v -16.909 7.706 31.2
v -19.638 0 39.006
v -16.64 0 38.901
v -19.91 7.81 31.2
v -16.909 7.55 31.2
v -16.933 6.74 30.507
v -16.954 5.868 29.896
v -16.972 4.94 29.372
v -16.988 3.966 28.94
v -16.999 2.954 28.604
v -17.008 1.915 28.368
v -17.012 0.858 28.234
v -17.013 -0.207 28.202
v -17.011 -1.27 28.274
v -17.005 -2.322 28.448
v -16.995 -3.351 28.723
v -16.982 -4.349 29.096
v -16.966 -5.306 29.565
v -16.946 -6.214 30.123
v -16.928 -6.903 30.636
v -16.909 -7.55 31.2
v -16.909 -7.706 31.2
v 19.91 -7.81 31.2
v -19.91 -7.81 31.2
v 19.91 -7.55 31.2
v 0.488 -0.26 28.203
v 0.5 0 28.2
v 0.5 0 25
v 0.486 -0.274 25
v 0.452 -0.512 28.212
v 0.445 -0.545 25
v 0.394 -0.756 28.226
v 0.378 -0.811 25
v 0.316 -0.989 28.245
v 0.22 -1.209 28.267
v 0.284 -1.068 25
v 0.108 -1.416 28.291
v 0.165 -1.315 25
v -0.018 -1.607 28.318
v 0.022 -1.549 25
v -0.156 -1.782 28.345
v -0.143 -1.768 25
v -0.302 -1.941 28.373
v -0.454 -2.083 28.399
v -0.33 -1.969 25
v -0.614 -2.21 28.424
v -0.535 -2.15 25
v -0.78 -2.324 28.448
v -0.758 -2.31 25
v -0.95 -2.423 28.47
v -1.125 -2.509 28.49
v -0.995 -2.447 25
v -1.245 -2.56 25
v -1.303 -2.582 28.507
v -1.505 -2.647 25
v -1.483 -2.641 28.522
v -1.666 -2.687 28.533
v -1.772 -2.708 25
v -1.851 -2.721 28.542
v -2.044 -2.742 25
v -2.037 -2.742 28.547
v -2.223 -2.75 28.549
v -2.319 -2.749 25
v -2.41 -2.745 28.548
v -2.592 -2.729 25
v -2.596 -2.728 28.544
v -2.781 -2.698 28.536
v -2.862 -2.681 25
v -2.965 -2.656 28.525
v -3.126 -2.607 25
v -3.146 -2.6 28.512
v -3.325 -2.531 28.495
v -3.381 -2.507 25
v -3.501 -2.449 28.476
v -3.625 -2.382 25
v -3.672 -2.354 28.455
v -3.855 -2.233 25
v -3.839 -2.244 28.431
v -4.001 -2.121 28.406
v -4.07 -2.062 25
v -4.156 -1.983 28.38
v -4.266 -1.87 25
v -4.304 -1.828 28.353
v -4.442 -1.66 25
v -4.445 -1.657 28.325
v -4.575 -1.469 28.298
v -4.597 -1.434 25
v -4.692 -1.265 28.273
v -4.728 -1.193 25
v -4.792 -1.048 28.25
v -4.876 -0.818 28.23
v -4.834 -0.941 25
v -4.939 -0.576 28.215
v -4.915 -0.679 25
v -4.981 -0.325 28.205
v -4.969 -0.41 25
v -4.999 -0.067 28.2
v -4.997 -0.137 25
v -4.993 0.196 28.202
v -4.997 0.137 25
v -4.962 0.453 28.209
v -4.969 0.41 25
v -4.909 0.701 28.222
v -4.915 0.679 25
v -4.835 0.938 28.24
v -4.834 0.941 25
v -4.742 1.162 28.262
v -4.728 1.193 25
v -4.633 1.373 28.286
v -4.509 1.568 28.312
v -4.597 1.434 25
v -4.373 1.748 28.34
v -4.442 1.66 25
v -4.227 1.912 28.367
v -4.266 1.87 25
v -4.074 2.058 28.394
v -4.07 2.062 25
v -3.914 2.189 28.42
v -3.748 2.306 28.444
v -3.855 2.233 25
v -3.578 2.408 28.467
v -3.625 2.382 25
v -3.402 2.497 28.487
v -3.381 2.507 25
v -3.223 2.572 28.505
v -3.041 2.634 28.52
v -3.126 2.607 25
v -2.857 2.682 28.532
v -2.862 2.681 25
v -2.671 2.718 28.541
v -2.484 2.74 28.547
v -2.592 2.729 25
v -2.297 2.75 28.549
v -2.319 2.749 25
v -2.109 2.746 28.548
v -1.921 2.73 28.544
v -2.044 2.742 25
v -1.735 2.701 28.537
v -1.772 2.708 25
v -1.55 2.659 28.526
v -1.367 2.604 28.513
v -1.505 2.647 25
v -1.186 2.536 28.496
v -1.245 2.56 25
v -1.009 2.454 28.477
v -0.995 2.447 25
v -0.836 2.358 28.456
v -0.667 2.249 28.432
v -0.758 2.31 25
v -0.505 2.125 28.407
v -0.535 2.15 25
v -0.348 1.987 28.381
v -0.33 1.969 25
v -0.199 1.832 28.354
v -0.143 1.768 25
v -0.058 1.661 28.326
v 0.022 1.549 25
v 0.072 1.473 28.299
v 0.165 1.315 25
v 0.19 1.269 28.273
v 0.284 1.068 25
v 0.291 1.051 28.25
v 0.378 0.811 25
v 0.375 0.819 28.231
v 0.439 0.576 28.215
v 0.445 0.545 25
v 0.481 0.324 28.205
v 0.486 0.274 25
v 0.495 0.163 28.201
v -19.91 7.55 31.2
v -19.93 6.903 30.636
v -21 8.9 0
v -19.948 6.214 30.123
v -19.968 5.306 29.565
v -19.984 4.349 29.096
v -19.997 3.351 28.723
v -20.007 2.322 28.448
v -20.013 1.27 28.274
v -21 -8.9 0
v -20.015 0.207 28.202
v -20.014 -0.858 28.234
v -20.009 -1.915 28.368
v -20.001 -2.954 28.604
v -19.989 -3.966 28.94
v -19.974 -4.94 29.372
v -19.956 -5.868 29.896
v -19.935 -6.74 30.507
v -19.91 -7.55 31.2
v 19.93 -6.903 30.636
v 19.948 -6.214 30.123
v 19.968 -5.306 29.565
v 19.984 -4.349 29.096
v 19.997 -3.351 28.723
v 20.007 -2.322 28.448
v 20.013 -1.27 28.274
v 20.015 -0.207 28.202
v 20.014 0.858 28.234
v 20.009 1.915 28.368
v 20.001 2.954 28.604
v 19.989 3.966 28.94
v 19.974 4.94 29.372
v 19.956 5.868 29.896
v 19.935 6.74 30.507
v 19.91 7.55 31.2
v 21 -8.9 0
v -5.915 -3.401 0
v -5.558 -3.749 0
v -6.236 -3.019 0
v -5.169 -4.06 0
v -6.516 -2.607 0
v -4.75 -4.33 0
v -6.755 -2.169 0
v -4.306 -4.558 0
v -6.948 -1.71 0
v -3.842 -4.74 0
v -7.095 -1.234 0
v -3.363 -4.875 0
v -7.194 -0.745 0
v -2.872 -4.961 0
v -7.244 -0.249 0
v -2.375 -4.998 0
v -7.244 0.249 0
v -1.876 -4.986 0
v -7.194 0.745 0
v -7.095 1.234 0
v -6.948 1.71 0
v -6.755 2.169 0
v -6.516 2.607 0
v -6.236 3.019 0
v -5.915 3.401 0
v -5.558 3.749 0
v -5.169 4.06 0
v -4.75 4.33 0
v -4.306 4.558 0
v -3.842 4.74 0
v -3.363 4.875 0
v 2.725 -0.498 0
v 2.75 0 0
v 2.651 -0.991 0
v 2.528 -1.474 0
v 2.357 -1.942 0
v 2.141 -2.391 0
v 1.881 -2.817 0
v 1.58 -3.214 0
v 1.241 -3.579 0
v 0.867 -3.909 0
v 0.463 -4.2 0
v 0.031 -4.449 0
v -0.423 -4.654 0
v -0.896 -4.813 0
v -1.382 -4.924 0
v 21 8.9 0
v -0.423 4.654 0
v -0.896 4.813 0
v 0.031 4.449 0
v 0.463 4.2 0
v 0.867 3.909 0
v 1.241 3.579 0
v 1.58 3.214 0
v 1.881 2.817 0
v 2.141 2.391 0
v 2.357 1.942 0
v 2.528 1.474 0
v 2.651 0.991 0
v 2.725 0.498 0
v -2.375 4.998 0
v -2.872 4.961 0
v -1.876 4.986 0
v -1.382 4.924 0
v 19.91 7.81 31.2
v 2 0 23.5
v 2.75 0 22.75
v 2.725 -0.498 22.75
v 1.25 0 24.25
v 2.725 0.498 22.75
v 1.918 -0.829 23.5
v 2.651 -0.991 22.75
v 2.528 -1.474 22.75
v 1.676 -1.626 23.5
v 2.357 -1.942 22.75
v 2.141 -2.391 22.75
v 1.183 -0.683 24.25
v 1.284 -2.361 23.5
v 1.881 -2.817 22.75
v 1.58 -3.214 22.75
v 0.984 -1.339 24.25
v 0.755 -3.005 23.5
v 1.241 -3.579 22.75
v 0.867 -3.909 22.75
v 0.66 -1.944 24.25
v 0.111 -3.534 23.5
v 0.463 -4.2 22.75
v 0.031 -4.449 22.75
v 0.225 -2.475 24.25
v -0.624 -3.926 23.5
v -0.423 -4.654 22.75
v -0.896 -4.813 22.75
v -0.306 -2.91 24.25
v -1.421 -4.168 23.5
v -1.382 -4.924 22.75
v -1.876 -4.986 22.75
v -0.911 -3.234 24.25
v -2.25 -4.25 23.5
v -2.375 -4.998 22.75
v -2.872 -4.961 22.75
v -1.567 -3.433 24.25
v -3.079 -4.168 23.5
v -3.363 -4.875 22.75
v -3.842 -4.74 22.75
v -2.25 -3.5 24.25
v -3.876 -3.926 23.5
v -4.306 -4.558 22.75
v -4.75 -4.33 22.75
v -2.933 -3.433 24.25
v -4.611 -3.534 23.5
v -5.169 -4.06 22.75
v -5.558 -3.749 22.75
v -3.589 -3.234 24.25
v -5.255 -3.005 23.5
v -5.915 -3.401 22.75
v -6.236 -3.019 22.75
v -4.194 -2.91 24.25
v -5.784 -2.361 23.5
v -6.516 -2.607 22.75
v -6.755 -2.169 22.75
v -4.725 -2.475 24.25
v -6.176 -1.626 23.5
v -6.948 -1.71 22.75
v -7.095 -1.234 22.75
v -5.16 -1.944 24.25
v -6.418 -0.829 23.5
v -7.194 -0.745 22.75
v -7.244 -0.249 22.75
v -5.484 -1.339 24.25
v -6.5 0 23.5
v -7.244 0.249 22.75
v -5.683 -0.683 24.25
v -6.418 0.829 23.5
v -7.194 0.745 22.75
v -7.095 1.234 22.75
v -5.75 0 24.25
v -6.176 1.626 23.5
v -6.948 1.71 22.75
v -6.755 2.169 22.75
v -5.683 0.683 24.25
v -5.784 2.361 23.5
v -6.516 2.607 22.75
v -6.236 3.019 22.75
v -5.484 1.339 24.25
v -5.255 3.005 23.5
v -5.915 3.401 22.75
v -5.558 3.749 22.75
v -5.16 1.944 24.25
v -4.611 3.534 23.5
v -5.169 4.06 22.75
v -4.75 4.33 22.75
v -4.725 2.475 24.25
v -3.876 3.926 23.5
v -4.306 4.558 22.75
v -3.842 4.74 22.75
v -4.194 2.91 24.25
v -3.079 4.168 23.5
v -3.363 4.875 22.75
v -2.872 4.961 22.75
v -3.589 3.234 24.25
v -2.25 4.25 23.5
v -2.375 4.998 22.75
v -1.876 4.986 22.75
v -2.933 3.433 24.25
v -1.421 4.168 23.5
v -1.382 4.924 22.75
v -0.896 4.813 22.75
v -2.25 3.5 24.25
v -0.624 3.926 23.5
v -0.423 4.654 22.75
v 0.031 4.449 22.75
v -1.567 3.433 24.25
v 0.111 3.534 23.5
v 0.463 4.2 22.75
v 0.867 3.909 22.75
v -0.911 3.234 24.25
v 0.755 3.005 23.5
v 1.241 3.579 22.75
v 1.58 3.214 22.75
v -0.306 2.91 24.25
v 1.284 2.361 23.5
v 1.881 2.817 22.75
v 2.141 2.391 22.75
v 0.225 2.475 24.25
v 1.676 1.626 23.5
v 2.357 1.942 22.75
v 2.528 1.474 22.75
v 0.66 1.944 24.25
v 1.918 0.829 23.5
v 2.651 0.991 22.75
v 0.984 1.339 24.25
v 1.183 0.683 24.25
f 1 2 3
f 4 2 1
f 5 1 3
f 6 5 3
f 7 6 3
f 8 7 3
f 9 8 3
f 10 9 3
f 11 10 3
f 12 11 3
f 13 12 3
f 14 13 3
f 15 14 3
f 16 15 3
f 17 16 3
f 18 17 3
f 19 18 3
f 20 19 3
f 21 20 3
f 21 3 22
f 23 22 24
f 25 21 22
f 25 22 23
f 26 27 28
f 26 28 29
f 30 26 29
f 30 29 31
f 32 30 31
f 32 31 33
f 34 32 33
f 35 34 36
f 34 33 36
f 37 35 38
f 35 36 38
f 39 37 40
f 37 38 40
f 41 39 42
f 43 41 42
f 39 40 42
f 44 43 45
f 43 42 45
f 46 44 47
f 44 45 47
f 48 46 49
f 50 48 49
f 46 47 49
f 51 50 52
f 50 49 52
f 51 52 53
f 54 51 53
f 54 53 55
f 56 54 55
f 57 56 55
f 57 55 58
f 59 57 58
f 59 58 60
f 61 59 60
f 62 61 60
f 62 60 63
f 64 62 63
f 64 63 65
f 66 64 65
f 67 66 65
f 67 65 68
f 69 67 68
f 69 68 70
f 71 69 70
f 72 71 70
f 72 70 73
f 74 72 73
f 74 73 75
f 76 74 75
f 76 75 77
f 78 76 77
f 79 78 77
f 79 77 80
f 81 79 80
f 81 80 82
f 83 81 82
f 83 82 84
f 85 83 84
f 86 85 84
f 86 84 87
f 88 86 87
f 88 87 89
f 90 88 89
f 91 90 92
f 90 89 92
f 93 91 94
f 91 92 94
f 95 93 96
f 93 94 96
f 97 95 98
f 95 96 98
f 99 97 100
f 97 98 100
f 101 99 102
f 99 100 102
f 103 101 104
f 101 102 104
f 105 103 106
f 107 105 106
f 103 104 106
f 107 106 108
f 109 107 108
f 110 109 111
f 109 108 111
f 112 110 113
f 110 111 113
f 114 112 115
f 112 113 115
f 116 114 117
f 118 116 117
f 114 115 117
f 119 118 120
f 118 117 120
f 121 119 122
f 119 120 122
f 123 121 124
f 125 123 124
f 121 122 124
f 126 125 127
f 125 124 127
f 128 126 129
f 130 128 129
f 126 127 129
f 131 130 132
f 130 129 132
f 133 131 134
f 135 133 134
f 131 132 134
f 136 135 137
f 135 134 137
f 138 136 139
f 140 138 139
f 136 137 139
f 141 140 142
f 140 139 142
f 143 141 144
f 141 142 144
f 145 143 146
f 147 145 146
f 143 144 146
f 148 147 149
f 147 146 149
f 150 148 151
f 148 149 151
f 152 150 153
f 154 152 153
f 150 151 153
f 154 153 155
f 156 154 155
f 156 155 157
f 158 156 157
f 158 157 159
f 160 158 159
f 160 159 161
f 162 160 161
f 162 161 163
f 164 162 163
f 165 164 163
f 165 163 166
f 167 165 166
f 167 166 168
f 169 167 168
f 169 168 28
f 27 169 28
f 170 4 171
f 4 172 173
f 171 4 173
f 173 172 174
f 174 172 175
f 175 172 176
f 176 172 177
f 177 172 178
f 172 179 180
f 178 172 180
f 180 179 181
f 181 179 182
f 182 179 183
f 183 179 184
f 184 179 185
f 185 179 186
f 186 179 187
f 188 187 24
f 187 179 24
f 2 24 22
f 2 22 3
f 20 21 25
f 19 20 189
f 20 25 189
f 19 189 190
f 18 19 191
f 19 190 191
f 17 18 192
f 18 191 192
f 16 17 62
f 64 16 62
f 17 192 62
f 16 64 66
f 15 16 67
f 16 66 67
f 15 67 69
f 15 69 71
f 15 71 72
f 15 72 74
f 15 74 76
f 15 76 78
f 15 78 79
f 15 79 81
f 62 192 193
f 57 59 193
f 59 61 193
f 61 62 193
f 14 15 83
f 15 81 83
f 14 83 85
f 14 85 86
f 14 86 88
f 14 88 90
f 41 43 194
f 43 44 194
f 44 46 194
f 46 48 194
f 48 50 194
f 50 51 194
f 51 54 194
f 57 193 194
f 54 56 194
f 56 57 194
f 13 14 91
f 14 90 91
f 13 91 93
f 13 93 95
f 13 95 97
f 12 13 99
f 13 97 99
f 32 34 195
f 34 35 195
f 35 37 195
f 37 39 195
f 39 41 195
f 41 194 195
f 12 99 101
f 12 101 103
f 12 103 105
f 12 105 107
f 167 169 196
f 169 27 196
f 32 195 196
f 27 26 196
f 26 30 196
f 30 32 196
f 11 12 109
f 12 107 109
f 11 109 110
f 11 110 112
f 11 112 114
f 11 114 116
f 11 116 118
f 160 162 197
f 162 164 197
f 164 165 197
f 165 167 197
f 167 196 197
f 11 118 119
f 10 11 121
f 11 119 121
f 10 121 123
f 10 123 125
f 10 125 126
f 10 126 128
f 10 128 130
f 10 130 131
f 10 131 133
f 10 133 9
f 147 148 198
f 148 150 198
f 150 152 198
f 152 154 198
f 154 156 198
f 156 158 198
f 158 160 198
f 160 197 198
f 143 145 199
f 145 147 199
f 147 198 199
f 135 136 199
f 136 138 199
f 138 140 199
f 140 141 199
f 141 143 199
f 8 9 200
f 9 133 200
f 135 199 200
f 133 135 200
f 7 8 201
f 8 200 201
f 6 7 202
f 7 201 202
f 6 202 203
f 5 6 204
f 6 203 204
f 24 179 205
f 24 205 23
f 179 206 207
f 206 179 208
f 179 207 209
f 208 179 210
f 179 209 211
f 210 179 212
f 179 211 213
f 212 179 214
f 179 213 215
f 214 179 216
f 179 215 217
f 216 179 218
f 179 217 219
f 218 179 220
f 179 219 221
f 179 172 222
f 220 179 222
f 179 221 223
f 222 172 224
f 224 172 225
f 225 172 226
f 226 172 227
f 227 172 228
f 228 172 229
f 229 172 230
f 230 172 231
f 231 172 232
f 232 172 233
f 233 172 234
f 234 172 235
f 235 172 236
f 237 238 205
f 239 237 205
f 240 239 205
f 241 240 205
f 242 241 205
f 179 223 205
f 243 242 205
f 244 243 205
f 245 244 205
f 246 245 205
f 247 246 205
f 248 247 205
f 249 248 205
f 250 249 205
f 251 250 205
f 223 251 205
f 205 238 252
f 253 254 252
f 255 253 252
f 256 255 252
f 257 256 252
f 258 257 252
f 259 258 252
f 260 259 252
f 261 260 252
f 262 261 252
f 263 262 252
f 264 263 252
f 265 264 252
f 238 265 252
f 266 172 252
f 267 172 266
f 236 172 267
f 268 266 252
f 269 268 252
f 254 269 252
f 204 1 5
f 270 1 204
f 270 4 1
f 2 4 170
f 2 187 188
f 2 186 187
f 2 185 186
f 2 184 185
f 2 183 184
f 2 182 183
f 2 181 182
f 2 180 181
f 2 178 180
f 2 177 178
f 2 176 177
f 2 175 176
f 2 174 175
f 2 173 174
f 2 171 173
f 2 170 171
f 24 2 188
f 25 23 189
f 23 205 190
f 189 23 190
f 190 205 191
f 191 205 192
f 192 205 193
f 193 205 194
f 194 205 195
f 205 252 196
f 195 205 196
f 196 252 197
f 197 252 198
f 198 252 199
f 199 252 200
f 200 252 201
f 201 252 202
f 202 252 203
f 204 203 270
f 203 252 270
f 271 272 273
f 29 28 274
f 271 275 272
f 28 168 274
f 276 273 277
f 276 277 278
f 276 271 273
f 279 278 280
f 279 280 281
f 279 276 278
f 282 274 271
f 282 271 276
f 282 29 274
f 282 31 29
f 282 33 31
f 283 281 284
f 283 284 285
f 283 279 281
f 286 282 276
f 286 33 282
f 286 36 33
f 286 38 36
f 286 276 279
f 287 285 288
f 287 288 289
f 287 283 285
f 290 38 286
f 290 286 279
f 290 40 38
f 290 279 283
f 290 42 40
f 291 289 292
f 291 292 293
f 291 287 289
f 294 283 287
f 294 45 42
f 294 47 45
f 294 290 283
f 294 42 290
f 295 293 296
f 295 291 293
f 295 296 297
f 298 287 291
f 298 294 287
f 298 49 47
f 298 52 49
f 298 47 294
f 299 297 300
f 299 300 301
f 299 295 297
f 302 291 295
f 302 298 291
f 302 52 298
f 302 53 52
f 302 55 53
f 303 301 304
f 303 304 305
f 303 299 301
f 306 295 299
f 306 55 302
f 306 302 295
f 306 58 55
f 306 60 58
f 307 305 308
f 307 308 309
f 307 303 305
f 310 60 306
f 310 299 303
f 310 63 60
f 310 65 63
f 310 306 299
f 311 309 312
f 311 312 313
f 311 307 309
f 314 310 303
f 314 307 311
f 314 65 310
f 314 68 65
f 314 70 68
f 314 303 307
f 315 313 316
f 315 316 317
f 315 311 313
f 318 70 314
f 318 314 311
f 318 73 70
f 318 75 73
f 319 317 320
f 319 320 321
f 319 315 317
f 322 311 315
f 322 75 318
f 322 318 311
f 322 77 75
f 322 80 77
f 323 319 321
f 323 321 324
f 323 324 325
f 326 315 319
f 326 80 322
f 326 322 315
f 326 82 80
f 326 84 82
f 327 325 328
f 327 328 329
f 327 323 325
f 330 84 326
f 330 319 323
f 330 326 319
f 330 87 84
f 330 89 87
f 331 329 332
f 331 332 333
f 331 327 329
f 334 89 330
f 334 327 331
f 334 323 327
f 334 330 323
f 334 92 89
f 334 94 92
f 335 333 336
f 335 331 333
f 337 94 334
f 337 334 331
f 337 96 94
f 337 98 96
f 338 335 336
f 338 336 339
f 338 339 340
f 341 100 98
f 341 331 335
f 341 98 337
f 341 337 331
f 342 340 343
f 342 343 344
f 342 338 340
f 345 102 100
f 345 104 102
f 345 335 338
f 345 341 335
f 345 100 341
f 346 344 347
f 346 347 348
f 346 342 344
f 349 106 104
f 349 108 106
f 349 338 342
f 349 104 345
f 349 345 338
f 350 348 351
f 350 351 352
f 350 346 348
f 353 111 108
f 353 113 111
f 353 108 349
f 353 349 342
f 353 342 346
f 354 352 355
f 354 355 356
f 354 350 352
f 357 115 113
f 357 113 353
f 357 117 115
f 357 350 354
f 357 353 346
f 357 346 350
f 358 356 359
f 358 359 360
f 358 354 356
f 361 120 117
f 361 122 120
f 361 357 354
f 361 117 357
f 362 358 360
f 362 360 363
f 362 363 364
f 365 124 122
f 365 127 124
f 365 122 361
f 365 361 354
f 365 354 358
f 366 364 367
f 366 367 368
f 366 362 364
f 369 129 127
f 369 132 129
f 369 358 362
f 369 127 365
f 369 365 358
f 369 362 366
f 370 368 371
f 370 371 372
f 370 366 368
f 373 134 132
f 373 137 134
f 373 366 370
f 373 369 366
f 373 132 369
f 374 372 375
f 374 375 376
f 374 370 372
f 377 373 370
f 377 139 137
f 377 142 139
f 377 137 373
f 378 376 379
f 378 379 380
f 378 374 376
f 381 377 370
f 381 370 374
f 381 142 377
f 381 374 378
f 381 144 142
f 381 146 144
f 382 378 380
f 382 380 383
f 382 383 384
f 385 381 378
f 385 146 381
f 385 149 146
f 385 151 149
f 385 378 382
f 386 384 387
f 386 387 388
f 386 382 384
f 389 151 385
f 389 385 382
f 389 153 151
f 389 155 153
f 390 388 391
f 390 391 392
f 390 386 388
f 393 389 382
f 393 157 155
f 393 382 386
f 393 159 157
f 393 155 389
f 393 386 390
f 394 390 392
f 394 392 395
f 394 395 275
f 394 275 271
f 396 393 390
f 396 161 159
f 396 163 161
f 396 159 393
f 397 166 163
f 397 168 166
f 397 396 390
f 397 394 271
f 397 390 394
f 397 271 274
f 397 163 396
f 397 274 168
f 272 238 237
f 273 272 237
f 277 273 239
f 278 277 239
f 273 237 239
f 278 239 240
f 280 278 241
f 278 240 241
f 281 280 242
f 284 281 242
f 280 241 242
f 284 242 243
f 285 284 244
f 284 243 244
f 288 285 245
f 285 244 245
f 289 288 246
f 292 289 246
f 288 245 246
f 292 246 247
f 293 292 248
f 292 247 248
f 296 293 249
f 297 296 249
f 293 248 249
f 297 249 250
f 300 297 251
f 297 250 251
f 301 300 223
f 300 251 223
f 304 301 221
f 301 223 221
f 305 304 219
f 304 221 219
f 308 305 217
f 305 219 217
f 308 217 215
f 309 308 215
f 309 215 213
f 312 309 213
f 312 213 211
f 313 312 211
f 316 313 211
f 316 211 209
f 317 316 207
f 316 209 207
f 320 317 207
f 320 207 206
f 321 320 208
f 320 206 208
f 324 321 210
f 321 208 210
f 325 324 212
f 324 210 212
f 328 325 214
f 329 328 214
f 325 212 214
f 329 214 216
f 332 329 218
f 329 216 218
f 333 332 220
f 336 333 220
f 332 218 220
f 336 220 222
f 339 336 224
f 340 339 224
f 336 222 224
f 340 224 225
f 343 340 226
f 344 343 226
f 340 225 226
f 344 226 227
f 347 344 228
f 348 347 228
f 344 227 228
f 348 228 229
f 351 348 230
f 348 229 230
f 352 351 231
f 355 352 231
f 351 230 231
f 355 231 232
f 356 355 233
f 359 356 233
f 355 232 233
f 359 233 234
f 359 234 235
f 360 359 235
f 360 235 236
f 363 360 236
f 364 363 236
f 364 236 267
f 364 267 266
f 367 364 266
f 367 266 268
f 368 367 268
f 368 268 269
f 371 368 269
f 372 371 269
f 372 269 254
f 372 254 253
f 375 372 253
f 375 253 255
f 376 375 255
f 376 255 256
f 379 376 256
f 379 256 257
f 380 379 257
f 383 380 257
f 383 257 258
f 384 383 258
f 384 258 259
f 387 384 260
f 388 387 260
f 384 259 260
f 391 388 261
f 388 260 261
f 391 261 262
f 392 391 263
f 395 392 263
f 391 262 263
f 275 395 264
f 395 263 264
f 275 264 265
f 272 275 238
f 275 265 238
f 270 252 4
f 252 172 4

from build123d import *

# Parameters (mm, degrees)
F0_W     = 42
F0_H     = 17.8
F1_DEPTH = 31.2
F1_TAPER = 2
F2_R     = 11
F3_DEPTH = 25
F5_DEPTH = 3
F6_R     = 2.75
F7_DEPTH = 39.0067140634
F8_R     = 5
F8_R_2   = 2.75
F9_DEPTH = 25
F10_SIZE = 2.24999


# Not quite as in the source:
# - a fillet or chamfer is up to 0.001 mm smaller than in the source, because OpenCascade refuses the exact size


with BuildPart() as f1:
    # F0 (on Top) → F1 (new body)
    with BuildSketch(Plane.XY):
        Rectangle(F0_W, F0_H)
    extrude(amount=F1_DEPTH, taper=F1_TAPER)

    # F2 (on Right) → F3 (cut, symmetric)
    with BuildSketch(Plane.YZ):
        with Locations((0, 39.2)):
            Circle(F2_R)
    extrude(amount=F3_DEPTH, both=True, mode=Mode.SUBTRACT)

    # F4 (on face) → F5 (join)
    with BuildSketch(Plane(origin=(-20.9744225277, 0, 0.7324429743), x_dir=(0, -1, 0), z_dir=(-0.999390827, 0, 0.0348994967))):
        with BuildLine():
            Line((0, 38.2966003432), (-7.8104719919, 30.4861283514))
            Line((-7.8104719919, 30.4861283514), (-7.5498344353, 30.4861283514))
            add(Edge.make_bspline(
                [(7.5498344353, 30.4861283514), (0, 23.3567853482), (-7.5498344353, 30.4861283514)],
                knots=[2.3851362689, 2.3851362689, 2.3851362689, 3.8980490383, 3.8980490383, 3.8980490383], degree=2, weights=[1, 0.7272727273, 1]))
            Line((7.5498344353, 30.4861283514), (7.8104719919, 30.4861283514))
            Line((7.8104719919, 30.4861283514), (0, 38.2966003432))
        make_face()
    extrude(amount=-F5_DEPTH)

    # F6 (on face) → F7 (cut, through all)
    with BuildSketch(Plane(origin=(0, 0, 0), x_dir=(1, 0, 0), z_dir=(0, 0, -1))):
        with Locations((-2.25, 0)):
            Circle(F6_R)
    extrude(amount=-F7_DEPTH, mode=Mode.SUBTRACT)

    # F8 (on face) → F9 (cut)
    with BuildSketch(Plane(origin=(0, 0, 0), x_dir=(1, 0, 0), z_dir=(0, 0, -1))):
        with Locations((-2.25, 0)):
            Circle(F8_R)
        with Locations((-2.25, 0)):
            Circle(F8_R_2, mode=Mode.SUBTRACT)
    extrude(amount=-F9_DEPTH, mode=Mode.SUBTRACT)

    # F10 (size 2.25 in the source; OpenCascade refuses exactly that, so slightly less here)
    f10_edges = [f1.edges().sort_by_distance(p)[0] for p in [
        (-7.25, 0, 25),
    ]]
    chamfer(f10_edges, length=F10_SIZE)


solid = f1.part
